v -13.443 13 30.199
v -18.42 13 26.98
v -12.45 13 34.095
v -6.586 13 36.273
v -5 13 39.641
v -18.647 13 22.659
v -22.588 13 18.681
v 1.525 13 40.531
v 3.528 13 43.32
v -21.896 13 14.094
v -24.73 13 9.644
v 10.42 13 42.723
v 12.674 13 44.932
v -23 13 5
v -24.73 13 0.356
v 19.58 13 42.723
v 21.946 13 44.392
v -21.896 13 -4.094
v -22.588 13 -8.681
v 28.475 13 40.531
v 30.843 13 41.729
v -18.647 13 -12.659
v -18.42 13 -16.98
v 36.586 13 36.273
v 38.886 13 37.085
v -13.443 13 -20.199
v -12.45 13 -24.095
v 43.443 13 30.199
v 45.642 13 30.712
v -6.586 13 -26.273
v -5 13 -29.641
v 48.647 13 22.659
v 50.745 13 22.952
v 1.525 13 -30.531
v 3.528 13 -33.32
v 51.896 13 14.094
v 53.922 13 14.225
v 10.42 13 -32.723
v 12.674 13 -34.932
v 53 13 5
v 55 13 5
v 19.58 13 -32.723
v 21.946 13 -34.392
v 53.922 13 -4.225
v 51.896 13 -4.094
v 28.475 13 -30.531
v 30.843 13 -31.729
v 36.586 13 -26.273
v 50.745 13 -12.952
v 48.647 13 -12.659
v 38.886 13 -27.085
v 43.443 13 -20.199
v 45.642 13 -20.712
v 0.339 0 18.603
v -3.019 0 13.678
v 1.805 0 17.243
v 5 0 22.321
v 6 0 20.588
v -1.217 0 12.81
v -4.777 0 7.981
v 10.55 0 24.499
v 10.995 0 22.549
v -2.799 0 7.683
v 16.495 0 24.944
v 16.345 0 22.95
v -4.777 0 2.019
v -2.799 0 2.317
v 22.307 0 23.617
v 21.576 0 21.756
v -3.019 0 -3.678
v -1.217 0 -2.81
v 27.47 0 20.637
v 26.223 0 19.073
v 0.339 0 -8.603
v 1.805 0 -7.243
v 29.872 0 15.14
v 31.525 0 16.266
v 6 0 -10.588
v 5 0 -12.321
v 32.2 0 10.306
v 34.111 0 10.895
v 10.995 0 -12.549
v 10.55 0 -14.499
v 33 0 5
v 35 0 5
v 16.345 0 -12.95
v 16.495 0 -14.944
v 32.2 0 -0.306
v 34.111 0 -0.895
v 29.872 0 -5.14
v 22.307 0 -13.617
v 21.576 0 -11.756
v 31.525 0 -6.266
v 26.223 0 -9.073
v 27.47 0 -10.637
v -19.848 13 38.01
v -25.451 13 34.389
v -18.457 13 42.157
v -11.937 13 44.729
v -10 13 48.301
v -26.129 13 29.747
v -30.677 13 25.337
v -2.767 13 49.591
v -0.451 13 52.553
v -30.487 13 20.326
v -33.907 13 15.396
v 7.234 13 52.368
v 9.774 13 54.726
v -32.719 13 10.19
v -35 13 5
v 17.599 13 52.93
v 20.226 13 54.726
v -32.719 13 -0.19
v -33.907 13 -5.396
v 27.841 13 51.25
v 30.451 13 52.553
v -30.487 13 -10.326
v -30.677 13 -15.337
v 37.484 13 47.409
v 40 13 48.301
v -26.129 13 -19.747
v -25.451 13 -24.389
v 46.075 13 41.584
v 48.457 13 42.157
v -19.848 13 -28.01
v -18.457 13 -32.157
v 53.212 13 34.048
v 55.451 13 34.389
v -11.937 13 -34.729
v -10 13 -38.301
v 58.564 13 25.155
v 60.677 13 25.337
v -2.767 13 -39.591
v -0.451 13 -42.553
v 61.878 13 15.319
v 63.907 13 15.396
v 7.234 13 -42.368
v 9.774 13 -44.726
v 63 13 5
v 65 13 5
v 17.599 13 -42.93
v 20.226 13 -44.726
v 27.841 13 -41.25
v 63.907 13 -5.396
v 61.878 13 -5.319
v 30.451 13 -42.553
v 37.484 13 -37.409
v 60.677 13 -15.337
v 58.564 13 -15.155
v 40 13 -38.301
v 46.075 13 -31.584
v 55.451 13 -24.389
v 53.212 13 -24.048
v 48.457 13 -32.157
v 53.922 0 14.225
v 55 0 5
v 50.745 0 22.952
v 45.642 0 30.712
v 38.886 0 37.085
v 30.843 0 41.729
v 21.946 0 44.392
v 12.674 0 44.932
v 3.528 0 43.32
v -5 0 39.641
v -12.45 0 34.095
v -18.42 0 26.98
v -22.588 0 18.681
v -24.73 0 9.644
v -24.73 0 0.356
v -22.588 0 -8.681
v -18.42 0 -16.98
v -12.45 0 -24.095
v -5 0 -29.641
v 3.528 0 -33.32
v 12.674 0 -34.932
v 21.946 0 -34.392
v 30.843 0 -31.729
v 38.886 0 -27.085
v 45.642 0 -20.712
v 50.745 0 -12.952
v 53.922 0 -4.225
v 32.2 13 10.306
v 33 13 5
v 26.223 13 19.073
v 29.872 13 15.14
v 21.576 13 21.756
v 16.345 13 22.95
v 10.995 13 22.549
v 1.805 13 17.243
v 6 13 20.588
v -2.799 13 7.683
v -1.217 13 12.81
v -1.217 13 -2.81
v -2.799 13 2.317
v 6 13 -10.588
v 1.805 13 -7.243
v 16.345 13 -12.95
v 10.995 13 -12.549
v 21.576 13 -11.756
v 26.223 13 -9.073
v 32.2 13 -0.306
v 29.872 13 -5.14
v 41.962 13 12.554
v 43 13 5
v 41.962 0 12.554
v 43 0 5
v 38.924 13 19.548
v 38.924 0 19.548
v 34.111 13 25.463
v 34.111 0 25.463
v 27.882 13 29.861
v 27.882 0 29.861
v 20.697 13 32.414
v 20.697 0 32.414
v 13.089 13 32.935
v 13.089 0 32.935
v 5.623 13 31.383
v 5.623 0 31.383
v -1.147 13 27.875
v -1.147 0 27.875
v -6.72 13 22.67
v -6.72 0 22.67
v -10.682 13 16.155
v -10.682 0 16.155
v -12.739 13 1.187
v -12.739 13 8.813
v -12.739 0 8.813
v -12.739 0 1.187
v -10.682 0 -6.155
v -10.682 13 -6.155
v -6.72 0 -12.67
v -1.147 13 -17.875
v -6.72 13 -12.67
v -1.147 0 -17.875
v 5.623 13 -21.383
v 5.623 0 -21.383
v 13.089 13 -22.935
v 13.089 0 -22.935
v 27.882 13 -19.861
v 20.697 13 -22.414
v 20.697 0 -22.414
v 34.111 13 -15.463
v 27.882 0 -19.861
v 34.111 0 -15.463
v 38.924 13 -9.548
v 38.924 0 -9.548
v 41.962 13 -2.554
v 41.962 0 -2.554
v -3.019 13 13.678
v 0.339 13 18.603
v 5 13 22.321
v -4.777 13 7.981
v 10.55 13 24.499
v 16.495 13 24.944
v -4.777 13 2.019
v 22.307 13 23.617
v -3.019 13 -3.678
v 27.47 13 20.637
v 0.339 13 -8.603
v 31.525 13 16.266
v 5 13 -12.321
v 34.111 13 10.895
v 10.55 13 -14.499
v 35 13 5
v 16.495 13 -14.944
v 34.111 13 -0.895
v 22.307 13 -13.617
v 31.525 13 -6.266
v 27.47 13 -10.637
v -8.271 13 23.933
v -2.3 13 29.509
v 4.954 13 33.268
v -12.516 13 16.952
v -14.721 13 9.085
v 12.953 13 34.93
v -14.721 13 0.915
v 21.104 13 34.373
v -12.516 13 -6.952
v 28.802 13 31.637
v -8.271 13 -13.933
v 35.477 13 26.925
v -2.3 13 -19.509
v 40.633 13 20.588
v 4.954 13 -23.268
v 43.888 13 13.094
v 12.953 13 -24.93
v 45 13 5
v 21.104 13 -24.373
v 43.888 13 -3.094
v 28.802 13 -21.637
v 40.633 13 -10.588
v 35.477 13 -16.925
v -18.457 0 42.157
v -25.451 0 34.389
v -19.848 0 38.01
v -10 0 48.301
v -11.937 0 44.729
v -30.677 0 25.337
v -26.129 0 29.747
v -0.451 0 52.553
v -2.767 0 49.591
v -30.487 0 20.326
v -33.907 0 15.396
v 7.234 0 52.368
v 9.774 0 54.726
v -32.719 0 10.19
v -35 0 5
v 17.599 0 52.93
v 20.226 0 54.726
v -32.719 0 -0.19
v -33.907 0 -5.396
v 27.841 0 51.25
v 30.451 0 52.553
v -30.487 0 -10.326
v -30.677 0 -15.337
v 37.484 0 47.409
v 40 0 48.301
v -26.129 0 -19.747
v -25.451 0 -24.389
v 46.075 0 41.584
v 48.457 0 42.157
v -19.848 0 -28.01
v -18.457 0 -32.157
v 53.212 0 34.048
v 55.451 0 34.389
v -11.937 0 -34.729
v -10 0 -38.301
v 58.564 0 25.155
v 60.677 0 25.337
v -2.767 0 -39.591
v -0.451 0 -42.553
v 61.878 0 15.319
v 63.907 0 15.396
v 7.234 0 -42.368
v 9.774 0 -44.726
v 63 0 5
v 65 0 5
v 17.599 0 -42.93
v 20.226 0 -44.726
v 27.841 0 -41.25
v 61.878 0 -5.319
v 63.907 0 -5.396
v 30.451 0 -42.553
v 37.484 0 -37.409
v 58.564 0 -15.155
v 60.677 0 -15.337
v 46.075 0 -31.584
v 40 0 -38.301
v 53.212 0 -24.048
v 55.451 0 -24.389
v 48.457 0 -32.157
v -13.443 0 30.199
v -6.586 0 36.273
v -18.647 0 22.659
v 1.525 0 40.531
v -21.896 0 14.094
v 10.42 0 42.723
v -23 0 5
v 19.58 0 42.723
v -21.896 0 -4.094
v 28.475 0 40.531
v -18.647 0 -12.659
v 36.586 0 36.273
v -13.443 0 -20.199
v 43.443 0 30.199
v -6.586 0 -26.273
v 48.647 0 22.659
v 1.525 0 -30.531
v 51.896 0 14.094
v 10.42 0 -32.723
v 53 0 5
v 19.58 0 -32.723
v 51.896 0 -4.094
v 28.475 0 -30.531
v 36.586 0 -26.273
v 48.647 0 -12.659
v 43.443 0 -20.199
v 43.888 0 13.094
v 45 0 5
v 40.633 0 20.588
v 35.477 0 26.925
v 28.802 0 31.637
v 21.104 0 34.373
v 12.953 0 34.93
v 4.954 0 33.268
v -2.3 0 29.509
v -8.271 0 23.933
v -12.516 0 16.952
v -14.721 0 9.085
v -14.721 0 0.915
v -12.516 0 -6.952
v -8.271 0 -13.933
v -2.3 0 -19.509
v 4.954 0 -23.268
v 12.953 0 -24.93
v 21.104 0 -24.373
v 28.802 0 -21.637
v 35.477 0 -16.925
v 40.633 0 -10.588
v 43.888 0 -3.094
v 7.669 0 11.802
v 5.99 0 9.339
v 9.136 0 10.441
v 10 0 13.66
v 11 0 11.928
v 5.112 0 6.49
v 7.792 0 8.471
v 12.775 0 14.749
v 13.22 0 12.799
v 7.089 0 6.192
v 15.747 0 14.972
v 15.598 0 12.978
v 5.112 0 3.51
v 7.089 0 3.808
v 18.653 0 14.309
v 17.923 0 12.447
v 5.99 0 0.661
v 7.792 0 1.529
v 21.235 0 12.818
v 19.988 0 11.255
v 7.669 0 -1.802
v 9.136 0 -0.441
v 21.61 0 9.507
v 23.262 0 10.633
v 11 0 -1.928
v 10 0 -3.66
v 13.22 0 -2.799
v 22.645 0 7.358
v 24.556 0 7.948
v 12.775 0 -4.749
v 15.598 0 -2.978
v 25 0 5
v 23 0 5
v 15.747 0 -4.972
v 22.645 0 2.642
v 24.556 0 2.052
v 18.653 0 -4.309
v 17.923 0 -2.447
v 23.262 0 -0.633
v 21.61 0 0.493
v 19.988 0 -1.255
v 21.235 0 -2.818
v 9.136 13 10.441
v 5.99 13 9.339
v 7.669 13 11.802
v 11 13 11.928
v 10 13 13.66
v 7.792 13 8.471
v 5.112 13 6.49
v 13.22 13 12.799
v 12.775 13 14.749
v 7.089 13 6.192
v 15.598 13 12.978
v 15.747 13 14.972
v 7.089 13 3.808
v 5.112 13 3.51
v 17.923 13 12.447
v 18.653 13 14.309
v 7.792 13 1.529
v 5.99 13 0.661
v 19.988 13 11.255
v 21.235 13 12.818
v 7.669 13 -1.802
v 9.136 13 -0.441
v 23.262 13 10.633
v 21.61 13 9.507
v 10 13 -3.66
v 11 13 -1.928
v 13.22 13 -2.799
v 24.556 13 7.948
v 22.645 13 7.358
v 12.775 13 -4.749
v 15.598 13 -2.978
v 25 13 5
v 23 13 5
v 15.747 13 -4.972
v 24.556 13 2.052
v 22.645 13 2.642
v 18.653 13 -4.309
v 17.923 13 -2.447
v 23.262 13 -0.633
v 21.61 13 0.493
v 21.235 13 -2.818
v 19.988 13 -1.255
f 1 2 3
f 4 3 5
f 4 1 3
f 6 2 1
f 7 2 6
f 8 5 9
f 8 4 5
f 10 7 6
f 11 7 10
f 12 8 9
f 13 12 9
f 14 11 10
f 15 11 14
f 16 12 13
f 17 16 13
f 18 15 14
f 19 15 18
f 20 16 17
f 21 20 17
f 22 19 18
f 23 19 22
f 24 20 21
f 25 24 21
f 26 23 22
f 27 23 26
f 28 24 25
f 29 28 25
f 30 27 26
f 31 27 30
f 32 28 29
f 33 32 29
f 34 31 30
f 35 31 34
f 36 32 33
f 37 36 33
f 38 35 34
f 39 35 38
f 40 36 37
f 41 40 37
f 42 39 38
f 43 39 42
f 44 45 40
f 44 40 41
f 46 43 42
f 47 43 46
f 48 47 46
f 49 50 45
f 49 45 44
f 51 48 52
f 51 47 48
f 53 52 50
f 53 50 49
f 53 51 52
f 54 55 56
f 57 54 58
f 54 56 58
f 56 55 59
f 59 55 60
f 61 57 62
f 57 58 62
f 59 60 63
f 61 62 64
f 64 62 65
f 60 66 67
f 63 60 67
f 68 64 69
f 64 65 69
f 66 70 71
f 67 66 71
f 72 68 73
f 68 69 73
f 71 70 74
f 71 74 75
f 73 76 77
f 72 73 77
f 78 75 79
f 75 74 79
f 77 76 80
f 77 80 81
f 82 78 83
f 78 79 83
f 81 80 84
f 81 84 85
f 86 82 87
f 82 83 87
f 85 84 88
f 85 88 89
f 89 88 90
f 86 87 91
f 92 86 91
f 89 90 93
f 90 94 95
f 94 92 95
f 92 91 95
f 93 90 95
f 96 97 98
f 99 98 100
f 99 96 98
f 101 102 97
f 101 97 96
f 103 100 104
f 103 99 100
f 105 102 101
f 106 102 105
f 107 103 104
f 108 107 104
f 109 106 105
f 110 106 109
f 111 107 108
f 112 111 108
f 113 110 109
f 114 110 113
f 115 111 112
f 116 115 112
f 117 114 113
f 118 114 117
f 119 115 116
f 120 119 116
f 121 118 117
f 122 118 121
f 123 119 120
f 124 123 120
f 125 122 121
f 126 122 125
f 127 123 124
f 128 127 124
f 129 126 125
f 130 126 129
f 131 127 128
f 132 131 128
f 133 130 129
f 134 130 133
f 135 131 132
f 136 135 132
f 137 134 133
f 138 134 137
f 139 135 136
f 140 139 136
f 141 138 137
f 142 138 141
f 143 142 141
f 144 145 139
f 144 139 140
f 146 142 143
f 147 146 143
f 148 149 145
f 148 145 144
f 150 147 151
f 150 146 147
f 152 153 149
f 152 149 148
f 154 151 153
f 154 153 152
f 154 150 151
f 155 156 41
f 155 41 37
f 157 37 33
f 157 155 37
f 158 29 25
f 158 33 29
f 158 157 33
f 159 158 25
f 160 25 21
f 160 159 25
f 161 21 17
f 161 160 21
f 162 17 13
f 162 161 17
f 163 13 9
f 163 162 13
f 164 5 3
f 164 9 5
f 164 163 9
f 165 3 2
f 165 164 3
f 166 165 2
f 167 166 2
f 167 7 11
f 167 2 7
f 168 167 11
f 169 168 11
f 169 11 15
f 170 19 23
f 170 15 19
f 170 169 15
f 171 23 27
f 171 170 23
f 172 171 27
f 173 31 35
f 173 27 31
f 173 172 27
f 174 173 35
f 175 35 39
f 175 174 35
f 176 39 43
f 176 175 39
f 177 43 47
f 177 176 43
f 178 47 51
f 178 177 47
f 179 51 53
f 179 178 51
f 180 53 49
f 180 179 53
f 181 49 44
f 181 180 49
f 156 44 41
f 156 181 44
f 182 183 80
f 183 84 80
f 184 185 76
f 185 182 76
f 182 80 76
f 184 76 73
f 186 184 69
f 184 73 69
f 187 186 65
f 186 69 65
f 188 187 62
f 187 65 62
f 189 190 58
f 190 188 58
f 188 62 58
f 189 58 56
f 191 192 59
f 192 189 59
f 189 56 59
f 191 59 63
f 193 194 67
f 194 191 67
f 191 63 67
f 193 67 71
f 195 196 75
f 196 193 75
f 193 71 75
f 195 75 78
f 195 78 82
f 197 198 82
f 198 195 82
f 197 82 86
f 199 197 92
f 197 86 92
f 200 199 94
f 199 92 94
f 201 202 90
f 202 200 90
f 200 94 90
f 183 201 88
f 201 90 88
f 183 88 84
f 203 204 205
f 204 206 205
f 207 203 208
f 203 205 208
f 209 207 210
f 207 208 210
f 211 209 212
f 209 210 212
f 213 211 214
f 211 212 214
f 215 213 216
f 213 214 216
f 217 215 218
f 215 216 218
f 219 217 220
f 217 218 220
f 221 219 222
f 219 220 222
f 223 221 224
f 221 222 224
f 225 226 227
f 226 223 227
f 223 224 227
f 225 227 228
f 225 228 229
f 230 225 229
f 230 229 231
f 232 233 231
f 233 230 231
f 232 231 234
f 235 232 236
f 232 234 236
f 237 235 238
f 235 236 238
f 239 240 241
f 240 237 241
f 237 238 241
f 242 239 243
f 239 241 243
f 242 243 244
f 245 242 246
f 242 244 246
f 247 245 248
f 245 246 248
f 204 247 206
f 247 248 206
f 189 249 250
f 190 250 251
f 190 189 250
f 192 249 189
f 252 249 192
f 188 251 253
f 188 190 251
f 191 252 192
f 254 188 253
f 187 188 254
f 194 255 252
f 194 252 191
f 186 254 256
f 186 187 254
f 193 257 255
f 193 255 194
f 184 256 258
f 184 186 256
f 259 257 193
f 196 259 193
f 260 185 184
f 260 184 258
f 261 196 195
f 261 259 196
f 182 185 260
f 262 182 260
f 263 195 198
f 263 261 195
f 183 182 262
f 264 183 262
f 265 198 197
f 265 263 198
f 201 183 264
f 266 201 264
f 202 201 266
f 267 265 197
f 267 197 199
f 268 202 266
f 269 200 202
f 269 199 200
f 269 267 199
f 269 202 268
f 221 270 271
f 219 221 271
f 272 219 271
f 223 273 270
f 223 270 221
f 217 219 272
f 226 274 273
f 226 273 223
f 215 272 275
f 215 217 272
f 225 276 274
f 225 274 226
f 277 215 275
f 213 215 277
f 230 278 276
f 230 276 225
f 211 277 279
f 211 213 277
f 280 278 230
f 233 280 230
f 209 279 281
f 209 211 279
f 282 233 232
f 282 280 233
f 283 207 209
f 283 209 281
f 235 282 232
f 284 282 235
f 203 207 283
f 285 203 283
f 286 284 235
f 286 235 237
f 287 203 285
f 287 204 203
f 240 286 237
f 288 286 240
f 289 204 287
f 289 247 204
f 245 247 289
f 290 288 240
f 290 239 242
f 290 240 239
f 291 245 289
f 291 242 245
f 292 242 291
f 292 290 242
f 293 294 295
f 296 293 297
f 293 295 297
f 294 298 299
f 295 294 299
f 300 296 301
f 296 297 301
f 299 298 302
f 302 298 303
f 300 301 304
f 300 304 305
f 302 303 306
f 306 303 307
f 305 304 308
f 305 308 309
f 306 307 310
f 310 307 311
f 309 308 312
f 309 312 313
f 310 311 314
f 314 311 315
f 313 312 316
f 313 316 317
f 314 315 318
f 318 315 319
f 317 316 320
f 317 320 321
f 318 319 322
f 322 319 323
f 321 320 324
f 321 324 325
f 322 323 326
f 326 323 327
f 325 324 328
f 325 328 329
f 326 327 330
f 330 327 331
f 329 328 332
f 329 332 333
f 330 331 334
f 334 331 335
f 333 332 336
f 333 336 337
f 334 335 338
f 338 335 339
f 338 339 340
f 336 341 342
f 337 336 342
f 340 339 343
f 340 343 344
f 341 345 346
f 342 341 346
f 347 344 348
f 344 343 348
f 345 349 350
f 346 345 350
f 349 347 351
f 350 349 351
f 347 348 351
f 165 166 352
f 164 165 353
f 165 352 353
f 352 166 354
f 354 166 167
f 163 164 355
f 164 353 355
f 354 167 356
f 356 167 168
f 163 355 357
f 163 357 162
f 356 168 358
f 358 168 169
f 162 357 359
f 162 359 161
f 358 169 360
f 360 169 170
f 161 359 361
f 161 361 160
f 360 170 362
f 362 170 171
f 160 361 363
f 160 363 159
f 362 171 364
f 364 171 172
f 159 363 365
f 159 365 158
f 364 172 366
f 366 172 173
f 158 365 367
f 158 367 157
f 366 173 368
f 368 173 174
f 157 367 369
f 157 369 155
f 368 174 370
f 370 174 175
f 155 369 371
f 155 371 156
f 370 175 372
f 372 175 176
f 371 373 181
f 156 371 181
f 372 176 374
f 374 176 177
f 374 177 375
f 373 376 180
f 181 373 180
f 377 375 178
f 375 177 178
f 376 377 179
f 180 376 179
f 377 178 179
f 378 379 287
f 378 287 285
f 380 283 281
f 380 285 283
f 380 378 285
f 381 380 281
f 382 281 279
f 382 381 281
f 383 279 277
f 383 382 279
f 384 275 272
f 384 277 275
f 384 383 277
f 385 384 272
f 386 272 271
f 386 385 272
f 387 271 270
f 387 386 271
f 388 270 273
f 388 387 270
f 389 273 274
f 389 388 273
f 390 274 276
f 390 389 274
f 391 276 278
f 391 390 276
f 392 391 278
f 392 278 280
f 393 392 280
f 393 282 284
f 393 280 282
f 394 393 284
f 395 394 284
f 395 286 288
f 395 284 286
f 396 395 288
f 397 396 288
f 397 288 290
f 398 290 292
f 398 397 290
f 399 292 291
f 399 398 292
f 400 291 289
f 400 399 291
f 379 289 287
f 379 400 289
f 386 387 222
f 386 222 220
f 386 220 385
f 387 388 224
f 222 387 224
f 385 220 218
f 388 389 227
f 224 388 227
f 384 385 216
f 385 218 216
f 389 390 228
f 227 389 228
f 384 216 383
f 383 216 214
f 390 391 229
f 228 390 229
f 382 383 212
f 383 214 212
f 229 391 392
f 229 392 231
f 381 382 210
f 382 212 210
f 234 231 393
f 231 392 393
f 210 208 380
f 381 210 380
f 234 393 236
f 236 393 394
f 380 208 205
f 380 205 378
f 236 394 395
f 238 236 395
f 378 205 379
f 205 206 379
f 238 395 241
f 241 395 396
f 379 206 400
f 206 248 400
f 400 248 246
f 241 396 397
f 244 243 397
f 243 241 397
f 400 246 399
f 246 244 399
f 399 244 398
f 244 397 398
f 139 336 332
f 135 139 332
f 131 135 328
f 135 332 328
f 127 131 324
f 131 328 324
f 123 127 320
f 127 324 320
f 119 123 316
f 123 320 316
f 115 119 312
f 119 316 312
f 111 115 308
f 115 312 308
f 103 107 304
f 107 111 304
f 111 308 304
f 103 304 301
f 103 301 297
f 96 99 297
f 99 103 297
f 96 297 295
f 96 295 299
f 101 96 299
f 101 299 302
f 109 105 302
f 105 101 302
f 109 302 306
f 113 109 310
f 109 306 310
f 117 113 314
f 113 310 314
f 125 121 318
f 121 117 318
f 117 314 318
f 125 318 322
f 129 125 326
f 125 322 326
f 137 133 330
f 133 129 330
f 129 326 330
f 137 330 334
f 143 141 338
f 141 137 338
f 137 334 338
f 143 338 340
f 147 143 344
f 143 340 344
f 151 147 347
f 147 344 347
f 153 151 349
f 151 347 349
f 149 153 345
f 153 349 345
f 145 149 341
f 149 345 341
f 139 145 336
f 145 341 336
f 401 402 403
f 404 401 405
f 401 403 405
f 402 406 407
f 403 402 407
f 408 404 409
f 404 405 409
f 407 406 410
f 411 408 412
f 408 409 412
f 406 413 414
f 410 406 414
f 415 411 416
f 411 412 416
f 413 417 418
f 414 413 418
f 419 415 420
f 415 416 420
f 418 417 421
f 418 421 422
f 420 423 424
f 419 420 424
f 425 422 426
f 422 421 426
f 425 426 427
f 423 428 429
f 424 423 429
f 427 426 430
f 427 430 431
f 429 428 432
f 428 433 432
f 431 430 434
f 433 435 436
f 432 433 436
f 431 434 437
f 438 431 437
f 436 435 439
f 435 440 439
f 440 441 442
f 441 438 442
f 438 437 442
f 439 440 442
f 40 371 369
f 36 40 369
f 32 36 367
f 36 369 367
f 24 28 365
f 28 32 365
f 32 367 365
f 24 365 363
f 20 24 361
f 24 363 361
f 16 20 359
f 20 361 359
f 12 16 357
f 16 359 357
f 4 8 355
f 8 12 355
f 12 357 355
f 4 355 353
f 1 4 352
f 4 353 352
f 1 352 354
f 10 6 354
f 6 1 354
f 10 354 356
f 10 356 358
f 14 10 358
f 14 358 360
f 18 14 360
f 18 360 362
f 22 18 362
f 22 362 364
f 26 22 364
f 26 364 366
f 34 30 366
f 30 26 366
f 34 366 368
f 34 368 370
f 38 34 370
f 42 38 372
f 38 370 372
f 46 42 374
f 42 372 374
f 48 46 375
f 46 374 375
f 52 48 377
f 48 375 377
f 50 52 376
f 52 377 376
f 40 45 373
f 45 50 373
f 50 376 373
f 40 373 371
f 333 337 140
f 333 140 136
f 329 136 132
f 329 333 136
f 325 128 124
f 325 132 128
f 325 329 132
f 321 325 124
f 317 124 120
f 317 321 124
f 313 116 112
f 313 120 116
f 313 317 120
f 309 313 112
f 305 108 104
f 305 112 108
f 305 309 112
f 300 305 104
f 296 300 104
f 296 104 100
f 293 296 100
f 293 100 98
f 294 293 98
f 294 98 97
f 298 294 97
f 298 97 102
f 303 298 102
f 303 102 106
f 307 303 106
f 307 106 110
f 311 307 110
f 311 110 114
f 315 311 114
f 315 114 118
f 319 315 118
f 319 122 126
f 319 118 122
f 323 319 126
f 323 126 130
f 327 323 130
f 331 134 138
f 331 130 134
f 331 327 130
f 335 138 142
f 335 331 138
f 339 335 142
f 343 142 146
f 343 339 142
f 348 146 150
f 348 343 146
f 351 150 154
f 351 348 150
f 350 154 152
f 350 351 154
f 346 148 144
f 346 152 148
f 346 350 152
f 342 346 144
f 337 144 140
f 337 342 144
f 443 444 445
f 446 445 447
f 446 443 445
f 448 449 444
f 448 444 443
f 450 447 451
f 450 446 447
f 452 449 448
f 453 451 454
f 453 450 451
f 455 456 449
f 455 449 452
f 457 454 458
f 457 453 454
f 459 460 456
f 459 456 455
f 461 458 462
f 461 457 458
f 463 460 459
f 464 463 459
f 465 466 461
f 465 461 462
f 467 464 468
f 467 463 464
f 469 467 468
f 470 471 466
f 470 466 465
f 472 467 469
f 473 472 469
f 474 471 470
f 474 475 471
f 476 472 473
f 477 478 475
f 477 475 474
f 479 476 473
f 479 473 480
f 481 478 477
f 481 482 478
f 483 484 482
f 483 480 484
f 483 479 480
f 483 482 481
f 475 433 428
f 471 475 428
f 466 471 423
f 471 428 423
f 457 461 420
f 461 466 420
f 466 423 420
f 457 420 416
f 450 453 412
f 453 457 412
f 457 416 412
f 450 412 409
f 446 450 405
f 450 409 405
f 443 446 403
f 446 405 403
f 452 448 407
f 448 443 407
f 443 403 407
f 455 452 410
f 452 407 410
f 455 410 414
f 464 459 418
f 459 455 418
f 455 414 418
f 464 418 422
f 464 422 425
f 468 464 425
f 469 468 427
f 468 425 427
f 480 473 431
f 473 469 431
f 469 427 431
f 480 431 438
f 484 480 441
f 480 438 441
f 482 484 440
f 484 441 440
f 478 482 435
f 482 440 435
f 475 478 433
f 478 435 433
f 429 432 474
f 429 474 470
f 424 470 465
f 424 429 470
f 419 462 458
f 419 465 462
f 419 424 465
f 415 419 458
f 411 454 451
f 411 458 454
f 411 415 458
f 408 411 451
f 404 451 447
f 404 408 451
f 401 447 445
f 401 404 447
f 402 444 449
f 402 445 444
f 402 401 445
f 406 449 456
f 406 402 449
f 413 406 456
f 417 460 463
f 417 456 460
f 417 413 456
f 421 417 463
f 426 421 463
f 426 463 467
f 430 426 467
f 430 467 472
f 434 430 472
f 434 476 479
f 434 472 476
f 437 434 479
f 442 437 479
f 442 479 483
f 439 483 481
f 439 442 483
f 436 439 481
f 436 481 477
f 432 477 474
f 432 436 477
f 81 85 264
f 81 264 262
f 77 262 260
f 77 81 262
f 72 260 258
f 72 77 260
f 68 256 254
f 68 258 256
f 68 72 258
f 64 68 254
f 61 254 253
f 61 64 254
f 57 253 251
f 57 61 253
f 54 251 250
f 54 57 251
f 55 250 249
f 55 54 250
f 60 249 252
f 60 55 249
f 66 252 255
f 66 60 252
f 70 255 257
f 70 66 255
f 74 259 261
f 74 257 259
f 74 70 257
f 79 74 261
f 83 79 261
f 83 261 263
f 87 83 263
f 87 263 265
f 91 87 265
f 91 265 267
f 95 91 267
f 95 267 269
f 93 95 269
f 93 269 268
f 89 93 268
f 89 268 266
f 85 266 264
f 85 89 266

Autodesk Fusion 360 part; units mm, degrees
sketch "Sketch1" plane through (0, 0, 0) normal (0, 1, 0) x (1, 0, 0)
  circle A0 centre (15, -5) radius 50
  circle A1 centre (15, -5) radius 48
  circle A2 centre (15, -5) radius 40
  circle A3 centre (15, -5) radius 38
  circle A4 centre (15, -5) radius 30
  circle A5 centre (15, -5) radius 28
  circle A6 centre (15, -5) radius 20
  circle A7 centre (15, -5) radius 18
  circle A8 centre (15, -5) radius 10
  circle A9 centre (15, -5) radius 8
  dimension "d2" = -2
  dimension "d4" = -2
  dimension "d6" = -2
  dimension "d8" = -2
  dimension "d10" = -2
extrude "Extrude1" add sketch "Sketch1" along normal blind 13 makes body 1 at (44.8509, 8.6667, 7.987) makes body 2 at (54.8012, 8.6667, 8.9827) makes body 3 at (34.9006, 8.6667, 6.9914) makes body 4 at (64.7515, 8.6667, 9.9784) makes body 5 at (24.9503, 8.6667, 5.9957)
